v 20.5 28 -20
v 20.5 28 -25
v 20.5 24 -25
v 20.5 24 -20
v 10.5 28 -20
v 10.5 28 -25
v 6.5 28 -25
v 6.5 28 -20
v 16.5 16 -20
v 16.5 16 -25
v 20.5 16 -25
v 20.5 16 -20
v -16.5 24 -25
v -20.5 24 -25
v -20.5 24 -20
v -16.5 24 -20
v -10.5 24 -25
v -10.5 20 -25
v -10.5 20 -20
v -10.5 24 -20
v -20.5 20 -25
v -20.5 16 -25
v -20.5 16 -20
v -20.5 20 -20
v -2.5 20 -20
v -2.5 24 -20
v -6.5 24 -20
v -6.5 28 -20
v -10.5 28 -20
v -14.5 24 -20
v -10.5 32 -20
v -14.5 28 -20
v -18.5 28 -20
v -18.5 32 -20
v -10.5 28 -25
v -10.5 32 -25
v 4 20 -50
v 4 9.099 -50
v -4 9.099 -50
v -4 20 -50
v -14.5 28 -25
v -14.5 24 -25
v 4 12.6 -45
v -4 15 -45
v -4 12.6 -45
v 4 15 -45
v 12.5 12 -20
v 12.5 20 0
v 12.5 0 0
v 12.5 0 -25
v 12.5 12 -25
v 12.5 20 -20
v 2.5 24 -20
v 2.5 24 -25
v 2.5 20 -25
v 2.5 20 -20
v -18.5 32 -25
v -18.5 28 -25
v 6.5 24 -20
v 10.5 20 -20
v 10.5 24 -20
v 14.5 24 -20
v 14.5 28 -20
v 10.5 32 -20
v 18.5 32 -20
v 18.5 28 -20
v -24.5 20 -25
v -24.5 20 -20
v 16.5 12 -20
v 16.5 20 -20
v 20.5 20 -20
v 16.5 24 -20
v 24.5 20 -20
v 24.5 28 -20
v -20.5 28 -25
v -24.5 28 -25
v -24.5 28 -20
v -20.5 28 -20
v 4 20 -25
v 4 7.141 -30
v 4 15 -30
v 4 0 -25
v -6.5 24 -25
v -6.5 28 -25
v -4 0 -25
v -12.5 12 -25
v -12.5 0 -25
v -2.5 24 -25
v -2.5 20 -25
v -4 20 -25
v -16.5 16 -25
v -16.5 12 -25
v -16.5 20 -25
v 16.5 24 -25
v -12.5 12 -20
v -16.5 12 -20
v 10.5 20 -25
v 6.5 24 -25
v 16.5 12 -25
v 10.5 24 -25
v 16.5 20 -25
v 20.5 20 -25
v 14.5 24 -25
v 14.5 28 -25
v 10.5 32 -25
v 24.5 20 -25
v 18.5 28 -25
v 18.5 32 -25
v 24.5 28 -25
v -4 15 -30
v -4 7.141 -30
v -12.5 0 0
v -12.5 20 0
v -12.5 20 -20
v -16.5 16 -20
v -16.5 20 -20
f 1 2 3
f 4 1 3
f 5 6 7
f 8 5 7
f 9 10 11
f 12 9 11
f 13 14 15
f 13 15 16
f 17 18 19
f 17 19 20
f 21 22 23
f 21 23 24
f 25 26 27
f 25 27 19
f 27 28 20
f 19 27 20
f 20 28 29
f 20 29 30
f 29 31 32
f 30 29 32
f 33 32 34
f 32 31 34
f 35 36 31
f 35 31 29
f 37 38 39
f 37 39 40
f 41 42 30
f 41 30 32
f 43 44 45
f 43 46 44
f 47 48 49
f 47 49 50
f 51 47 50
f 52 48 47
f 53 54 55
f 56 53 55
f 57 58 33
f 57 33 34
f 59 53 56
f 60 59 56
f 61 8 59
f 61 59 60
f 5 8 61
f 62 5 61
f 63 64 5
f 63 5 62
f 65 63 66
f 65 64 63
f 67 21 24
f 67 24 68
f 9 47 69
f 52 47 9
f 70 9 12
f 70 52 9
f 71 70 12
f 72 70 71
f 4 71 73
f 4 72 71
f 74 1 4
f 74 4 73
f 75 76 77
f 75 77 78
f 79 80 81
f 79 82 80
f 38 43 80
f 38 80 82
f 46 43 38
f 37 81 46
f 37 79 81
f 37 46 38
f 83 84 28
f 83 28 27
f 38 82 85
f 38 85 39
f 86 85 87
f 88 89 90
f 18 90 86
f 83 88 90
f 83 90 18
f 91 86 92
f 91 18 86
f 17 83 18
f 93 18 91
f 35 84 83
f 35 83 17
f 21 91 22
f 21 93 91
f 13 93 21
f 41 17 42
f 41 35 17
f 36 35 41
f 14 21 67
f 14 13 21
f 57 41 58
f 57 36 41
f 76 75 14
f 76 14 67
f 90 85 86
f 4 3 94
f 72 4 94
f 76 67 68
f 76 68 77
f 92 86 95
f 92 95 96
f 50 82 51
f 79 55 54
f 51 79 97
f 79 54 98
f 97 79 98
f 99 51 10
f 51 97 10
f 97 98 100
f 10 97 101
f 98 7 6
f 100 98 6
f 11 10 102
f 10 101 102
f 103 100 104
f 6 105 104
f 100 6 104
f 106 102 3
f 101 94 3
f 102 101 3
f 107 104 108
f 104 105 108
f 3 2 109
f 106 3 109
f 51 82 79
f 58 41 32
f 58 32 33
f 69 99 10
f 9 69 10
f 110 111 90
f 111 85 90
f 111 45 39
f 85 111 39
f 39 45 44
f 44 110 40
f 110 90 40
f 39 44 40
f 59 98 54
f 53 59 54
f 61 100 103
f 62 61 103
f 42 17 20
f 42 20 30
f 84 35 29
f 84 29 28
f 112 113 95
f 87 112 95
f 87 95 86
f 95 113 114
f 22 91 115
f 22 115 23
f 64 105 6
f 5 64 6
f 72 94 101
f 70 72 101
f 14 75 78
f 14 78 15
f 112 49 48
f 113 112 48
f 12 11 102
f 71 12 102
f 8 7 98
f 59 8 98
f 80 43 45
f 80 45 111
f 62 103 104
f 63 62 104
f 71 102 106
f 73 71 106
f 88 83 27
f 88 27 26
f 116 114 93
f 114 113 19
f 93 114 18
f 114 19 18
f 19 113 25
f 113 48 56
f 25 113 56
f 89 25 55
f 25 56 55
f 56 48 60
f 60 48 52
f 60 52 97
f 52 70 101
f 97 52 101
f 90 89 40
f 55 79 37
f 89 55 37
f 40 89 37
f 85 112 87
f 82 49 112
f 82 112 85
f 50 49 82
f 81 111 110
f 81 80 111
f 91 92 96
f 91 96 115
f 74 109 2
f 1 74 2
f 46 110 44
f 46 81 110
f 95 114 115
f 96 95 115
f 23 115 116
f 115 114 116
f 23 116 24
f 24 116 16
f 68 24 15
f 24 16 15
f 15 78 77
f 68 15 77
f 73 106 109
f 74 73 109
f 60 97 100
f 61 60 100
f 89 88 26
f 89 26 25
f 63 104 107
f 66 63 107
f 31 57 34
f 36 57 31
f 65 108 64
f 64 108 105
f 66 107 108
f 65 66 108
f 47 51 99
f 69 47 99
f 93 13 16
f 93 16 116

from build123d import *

# Parameters (mm, degrees)
SKETCH_1_W      = 25
SKETCH_1_H      = 20
EXTRUDE_2_DEPTH = 12.5
EXTRUDE_3_DEPTH = 4
EXTRUDE_4_DEPTH = 5


with BuildPart() as part:
    # Эскиз1 → Бобышка-Вытянуть2 (new, symmetric)
    with BuildSketch(Plane(origin=(0, 0, 0), x_dir=(0, 0, -1), z_dir=(1, 0, 0))):
        with Locations((12.5, 10)):
            Rectangle(SKETCH_1_W, SKETCH_1_H)
    extrude(amount=EXTRUDE_2_DEPTH, both=True)

    # Эскиз1<4> → Бобышка-Вытянуть3 (add, symmetric)
    with BuildSketch(Plane(origin=(0, 0, 0), x_dir=(0, 0, -1), z_dir=(1, 0, 0))):
        Polygon((25, 20), (25, 0), (50, 9.099255857), (50, 20), align=None)
        Polygon((45, 12.600293548), (30, 7.140740034), (30, 15), (45, 15), align=None, mode=Mode.SUBTRACT)
    extrude(amount=EXTRUDE_3_DEPTH, both=True)

    # Эскиз3 → Бобышка-Вытянуть4 (add)
    with BuildSketch(Plane(origin=(0, 0, -25), x_dir=(-1, 0, 0), z_dir=(0, 0, -1))):
        Polygon((-12.5, 12), (-16.5, 12), (-16.5, 16), (-20.5, 16), (-20.5, 20), (-24.5, 20), (-24.5, 28), (-20.5, 28), (-20.5, 24), (-16.5, 24), (-16.5, 20), (-12.5, 20), align=None)
        Polygon((20.5, 20), (24.5, 20), (24.5, 28), (20.5, 28), (20.5, 24), (16.5, 24), (16.5, 20), (12.5, 20), (12.5, 12), (16.5, 12), (16.5, 16), (20.5, 16), align=None)
        Polygon((-10.5, 20), (-10.5, 24), (-14.5, 24), (-14.5, 28), (-18.5, 28), (-18.5, 32), (-10.5, 32), (-10.5, 28), (-6.5, 28), (-6.5, 24), (-2.5, 24), (-2.5, 20), align=None)
        Polygon((10.5, 20), (10.5, 24), (14.5, 24), (14.5, 28), (18.5, 28), (18.5, 32), (10.5, 32), (10.5, 28), (6.5, 28), (6.5, 24), (2.5, 24), (2.5, 20), align=None)
    extrude(amount=-EXTRUDE_4_DEPTH)


solid = part.part
